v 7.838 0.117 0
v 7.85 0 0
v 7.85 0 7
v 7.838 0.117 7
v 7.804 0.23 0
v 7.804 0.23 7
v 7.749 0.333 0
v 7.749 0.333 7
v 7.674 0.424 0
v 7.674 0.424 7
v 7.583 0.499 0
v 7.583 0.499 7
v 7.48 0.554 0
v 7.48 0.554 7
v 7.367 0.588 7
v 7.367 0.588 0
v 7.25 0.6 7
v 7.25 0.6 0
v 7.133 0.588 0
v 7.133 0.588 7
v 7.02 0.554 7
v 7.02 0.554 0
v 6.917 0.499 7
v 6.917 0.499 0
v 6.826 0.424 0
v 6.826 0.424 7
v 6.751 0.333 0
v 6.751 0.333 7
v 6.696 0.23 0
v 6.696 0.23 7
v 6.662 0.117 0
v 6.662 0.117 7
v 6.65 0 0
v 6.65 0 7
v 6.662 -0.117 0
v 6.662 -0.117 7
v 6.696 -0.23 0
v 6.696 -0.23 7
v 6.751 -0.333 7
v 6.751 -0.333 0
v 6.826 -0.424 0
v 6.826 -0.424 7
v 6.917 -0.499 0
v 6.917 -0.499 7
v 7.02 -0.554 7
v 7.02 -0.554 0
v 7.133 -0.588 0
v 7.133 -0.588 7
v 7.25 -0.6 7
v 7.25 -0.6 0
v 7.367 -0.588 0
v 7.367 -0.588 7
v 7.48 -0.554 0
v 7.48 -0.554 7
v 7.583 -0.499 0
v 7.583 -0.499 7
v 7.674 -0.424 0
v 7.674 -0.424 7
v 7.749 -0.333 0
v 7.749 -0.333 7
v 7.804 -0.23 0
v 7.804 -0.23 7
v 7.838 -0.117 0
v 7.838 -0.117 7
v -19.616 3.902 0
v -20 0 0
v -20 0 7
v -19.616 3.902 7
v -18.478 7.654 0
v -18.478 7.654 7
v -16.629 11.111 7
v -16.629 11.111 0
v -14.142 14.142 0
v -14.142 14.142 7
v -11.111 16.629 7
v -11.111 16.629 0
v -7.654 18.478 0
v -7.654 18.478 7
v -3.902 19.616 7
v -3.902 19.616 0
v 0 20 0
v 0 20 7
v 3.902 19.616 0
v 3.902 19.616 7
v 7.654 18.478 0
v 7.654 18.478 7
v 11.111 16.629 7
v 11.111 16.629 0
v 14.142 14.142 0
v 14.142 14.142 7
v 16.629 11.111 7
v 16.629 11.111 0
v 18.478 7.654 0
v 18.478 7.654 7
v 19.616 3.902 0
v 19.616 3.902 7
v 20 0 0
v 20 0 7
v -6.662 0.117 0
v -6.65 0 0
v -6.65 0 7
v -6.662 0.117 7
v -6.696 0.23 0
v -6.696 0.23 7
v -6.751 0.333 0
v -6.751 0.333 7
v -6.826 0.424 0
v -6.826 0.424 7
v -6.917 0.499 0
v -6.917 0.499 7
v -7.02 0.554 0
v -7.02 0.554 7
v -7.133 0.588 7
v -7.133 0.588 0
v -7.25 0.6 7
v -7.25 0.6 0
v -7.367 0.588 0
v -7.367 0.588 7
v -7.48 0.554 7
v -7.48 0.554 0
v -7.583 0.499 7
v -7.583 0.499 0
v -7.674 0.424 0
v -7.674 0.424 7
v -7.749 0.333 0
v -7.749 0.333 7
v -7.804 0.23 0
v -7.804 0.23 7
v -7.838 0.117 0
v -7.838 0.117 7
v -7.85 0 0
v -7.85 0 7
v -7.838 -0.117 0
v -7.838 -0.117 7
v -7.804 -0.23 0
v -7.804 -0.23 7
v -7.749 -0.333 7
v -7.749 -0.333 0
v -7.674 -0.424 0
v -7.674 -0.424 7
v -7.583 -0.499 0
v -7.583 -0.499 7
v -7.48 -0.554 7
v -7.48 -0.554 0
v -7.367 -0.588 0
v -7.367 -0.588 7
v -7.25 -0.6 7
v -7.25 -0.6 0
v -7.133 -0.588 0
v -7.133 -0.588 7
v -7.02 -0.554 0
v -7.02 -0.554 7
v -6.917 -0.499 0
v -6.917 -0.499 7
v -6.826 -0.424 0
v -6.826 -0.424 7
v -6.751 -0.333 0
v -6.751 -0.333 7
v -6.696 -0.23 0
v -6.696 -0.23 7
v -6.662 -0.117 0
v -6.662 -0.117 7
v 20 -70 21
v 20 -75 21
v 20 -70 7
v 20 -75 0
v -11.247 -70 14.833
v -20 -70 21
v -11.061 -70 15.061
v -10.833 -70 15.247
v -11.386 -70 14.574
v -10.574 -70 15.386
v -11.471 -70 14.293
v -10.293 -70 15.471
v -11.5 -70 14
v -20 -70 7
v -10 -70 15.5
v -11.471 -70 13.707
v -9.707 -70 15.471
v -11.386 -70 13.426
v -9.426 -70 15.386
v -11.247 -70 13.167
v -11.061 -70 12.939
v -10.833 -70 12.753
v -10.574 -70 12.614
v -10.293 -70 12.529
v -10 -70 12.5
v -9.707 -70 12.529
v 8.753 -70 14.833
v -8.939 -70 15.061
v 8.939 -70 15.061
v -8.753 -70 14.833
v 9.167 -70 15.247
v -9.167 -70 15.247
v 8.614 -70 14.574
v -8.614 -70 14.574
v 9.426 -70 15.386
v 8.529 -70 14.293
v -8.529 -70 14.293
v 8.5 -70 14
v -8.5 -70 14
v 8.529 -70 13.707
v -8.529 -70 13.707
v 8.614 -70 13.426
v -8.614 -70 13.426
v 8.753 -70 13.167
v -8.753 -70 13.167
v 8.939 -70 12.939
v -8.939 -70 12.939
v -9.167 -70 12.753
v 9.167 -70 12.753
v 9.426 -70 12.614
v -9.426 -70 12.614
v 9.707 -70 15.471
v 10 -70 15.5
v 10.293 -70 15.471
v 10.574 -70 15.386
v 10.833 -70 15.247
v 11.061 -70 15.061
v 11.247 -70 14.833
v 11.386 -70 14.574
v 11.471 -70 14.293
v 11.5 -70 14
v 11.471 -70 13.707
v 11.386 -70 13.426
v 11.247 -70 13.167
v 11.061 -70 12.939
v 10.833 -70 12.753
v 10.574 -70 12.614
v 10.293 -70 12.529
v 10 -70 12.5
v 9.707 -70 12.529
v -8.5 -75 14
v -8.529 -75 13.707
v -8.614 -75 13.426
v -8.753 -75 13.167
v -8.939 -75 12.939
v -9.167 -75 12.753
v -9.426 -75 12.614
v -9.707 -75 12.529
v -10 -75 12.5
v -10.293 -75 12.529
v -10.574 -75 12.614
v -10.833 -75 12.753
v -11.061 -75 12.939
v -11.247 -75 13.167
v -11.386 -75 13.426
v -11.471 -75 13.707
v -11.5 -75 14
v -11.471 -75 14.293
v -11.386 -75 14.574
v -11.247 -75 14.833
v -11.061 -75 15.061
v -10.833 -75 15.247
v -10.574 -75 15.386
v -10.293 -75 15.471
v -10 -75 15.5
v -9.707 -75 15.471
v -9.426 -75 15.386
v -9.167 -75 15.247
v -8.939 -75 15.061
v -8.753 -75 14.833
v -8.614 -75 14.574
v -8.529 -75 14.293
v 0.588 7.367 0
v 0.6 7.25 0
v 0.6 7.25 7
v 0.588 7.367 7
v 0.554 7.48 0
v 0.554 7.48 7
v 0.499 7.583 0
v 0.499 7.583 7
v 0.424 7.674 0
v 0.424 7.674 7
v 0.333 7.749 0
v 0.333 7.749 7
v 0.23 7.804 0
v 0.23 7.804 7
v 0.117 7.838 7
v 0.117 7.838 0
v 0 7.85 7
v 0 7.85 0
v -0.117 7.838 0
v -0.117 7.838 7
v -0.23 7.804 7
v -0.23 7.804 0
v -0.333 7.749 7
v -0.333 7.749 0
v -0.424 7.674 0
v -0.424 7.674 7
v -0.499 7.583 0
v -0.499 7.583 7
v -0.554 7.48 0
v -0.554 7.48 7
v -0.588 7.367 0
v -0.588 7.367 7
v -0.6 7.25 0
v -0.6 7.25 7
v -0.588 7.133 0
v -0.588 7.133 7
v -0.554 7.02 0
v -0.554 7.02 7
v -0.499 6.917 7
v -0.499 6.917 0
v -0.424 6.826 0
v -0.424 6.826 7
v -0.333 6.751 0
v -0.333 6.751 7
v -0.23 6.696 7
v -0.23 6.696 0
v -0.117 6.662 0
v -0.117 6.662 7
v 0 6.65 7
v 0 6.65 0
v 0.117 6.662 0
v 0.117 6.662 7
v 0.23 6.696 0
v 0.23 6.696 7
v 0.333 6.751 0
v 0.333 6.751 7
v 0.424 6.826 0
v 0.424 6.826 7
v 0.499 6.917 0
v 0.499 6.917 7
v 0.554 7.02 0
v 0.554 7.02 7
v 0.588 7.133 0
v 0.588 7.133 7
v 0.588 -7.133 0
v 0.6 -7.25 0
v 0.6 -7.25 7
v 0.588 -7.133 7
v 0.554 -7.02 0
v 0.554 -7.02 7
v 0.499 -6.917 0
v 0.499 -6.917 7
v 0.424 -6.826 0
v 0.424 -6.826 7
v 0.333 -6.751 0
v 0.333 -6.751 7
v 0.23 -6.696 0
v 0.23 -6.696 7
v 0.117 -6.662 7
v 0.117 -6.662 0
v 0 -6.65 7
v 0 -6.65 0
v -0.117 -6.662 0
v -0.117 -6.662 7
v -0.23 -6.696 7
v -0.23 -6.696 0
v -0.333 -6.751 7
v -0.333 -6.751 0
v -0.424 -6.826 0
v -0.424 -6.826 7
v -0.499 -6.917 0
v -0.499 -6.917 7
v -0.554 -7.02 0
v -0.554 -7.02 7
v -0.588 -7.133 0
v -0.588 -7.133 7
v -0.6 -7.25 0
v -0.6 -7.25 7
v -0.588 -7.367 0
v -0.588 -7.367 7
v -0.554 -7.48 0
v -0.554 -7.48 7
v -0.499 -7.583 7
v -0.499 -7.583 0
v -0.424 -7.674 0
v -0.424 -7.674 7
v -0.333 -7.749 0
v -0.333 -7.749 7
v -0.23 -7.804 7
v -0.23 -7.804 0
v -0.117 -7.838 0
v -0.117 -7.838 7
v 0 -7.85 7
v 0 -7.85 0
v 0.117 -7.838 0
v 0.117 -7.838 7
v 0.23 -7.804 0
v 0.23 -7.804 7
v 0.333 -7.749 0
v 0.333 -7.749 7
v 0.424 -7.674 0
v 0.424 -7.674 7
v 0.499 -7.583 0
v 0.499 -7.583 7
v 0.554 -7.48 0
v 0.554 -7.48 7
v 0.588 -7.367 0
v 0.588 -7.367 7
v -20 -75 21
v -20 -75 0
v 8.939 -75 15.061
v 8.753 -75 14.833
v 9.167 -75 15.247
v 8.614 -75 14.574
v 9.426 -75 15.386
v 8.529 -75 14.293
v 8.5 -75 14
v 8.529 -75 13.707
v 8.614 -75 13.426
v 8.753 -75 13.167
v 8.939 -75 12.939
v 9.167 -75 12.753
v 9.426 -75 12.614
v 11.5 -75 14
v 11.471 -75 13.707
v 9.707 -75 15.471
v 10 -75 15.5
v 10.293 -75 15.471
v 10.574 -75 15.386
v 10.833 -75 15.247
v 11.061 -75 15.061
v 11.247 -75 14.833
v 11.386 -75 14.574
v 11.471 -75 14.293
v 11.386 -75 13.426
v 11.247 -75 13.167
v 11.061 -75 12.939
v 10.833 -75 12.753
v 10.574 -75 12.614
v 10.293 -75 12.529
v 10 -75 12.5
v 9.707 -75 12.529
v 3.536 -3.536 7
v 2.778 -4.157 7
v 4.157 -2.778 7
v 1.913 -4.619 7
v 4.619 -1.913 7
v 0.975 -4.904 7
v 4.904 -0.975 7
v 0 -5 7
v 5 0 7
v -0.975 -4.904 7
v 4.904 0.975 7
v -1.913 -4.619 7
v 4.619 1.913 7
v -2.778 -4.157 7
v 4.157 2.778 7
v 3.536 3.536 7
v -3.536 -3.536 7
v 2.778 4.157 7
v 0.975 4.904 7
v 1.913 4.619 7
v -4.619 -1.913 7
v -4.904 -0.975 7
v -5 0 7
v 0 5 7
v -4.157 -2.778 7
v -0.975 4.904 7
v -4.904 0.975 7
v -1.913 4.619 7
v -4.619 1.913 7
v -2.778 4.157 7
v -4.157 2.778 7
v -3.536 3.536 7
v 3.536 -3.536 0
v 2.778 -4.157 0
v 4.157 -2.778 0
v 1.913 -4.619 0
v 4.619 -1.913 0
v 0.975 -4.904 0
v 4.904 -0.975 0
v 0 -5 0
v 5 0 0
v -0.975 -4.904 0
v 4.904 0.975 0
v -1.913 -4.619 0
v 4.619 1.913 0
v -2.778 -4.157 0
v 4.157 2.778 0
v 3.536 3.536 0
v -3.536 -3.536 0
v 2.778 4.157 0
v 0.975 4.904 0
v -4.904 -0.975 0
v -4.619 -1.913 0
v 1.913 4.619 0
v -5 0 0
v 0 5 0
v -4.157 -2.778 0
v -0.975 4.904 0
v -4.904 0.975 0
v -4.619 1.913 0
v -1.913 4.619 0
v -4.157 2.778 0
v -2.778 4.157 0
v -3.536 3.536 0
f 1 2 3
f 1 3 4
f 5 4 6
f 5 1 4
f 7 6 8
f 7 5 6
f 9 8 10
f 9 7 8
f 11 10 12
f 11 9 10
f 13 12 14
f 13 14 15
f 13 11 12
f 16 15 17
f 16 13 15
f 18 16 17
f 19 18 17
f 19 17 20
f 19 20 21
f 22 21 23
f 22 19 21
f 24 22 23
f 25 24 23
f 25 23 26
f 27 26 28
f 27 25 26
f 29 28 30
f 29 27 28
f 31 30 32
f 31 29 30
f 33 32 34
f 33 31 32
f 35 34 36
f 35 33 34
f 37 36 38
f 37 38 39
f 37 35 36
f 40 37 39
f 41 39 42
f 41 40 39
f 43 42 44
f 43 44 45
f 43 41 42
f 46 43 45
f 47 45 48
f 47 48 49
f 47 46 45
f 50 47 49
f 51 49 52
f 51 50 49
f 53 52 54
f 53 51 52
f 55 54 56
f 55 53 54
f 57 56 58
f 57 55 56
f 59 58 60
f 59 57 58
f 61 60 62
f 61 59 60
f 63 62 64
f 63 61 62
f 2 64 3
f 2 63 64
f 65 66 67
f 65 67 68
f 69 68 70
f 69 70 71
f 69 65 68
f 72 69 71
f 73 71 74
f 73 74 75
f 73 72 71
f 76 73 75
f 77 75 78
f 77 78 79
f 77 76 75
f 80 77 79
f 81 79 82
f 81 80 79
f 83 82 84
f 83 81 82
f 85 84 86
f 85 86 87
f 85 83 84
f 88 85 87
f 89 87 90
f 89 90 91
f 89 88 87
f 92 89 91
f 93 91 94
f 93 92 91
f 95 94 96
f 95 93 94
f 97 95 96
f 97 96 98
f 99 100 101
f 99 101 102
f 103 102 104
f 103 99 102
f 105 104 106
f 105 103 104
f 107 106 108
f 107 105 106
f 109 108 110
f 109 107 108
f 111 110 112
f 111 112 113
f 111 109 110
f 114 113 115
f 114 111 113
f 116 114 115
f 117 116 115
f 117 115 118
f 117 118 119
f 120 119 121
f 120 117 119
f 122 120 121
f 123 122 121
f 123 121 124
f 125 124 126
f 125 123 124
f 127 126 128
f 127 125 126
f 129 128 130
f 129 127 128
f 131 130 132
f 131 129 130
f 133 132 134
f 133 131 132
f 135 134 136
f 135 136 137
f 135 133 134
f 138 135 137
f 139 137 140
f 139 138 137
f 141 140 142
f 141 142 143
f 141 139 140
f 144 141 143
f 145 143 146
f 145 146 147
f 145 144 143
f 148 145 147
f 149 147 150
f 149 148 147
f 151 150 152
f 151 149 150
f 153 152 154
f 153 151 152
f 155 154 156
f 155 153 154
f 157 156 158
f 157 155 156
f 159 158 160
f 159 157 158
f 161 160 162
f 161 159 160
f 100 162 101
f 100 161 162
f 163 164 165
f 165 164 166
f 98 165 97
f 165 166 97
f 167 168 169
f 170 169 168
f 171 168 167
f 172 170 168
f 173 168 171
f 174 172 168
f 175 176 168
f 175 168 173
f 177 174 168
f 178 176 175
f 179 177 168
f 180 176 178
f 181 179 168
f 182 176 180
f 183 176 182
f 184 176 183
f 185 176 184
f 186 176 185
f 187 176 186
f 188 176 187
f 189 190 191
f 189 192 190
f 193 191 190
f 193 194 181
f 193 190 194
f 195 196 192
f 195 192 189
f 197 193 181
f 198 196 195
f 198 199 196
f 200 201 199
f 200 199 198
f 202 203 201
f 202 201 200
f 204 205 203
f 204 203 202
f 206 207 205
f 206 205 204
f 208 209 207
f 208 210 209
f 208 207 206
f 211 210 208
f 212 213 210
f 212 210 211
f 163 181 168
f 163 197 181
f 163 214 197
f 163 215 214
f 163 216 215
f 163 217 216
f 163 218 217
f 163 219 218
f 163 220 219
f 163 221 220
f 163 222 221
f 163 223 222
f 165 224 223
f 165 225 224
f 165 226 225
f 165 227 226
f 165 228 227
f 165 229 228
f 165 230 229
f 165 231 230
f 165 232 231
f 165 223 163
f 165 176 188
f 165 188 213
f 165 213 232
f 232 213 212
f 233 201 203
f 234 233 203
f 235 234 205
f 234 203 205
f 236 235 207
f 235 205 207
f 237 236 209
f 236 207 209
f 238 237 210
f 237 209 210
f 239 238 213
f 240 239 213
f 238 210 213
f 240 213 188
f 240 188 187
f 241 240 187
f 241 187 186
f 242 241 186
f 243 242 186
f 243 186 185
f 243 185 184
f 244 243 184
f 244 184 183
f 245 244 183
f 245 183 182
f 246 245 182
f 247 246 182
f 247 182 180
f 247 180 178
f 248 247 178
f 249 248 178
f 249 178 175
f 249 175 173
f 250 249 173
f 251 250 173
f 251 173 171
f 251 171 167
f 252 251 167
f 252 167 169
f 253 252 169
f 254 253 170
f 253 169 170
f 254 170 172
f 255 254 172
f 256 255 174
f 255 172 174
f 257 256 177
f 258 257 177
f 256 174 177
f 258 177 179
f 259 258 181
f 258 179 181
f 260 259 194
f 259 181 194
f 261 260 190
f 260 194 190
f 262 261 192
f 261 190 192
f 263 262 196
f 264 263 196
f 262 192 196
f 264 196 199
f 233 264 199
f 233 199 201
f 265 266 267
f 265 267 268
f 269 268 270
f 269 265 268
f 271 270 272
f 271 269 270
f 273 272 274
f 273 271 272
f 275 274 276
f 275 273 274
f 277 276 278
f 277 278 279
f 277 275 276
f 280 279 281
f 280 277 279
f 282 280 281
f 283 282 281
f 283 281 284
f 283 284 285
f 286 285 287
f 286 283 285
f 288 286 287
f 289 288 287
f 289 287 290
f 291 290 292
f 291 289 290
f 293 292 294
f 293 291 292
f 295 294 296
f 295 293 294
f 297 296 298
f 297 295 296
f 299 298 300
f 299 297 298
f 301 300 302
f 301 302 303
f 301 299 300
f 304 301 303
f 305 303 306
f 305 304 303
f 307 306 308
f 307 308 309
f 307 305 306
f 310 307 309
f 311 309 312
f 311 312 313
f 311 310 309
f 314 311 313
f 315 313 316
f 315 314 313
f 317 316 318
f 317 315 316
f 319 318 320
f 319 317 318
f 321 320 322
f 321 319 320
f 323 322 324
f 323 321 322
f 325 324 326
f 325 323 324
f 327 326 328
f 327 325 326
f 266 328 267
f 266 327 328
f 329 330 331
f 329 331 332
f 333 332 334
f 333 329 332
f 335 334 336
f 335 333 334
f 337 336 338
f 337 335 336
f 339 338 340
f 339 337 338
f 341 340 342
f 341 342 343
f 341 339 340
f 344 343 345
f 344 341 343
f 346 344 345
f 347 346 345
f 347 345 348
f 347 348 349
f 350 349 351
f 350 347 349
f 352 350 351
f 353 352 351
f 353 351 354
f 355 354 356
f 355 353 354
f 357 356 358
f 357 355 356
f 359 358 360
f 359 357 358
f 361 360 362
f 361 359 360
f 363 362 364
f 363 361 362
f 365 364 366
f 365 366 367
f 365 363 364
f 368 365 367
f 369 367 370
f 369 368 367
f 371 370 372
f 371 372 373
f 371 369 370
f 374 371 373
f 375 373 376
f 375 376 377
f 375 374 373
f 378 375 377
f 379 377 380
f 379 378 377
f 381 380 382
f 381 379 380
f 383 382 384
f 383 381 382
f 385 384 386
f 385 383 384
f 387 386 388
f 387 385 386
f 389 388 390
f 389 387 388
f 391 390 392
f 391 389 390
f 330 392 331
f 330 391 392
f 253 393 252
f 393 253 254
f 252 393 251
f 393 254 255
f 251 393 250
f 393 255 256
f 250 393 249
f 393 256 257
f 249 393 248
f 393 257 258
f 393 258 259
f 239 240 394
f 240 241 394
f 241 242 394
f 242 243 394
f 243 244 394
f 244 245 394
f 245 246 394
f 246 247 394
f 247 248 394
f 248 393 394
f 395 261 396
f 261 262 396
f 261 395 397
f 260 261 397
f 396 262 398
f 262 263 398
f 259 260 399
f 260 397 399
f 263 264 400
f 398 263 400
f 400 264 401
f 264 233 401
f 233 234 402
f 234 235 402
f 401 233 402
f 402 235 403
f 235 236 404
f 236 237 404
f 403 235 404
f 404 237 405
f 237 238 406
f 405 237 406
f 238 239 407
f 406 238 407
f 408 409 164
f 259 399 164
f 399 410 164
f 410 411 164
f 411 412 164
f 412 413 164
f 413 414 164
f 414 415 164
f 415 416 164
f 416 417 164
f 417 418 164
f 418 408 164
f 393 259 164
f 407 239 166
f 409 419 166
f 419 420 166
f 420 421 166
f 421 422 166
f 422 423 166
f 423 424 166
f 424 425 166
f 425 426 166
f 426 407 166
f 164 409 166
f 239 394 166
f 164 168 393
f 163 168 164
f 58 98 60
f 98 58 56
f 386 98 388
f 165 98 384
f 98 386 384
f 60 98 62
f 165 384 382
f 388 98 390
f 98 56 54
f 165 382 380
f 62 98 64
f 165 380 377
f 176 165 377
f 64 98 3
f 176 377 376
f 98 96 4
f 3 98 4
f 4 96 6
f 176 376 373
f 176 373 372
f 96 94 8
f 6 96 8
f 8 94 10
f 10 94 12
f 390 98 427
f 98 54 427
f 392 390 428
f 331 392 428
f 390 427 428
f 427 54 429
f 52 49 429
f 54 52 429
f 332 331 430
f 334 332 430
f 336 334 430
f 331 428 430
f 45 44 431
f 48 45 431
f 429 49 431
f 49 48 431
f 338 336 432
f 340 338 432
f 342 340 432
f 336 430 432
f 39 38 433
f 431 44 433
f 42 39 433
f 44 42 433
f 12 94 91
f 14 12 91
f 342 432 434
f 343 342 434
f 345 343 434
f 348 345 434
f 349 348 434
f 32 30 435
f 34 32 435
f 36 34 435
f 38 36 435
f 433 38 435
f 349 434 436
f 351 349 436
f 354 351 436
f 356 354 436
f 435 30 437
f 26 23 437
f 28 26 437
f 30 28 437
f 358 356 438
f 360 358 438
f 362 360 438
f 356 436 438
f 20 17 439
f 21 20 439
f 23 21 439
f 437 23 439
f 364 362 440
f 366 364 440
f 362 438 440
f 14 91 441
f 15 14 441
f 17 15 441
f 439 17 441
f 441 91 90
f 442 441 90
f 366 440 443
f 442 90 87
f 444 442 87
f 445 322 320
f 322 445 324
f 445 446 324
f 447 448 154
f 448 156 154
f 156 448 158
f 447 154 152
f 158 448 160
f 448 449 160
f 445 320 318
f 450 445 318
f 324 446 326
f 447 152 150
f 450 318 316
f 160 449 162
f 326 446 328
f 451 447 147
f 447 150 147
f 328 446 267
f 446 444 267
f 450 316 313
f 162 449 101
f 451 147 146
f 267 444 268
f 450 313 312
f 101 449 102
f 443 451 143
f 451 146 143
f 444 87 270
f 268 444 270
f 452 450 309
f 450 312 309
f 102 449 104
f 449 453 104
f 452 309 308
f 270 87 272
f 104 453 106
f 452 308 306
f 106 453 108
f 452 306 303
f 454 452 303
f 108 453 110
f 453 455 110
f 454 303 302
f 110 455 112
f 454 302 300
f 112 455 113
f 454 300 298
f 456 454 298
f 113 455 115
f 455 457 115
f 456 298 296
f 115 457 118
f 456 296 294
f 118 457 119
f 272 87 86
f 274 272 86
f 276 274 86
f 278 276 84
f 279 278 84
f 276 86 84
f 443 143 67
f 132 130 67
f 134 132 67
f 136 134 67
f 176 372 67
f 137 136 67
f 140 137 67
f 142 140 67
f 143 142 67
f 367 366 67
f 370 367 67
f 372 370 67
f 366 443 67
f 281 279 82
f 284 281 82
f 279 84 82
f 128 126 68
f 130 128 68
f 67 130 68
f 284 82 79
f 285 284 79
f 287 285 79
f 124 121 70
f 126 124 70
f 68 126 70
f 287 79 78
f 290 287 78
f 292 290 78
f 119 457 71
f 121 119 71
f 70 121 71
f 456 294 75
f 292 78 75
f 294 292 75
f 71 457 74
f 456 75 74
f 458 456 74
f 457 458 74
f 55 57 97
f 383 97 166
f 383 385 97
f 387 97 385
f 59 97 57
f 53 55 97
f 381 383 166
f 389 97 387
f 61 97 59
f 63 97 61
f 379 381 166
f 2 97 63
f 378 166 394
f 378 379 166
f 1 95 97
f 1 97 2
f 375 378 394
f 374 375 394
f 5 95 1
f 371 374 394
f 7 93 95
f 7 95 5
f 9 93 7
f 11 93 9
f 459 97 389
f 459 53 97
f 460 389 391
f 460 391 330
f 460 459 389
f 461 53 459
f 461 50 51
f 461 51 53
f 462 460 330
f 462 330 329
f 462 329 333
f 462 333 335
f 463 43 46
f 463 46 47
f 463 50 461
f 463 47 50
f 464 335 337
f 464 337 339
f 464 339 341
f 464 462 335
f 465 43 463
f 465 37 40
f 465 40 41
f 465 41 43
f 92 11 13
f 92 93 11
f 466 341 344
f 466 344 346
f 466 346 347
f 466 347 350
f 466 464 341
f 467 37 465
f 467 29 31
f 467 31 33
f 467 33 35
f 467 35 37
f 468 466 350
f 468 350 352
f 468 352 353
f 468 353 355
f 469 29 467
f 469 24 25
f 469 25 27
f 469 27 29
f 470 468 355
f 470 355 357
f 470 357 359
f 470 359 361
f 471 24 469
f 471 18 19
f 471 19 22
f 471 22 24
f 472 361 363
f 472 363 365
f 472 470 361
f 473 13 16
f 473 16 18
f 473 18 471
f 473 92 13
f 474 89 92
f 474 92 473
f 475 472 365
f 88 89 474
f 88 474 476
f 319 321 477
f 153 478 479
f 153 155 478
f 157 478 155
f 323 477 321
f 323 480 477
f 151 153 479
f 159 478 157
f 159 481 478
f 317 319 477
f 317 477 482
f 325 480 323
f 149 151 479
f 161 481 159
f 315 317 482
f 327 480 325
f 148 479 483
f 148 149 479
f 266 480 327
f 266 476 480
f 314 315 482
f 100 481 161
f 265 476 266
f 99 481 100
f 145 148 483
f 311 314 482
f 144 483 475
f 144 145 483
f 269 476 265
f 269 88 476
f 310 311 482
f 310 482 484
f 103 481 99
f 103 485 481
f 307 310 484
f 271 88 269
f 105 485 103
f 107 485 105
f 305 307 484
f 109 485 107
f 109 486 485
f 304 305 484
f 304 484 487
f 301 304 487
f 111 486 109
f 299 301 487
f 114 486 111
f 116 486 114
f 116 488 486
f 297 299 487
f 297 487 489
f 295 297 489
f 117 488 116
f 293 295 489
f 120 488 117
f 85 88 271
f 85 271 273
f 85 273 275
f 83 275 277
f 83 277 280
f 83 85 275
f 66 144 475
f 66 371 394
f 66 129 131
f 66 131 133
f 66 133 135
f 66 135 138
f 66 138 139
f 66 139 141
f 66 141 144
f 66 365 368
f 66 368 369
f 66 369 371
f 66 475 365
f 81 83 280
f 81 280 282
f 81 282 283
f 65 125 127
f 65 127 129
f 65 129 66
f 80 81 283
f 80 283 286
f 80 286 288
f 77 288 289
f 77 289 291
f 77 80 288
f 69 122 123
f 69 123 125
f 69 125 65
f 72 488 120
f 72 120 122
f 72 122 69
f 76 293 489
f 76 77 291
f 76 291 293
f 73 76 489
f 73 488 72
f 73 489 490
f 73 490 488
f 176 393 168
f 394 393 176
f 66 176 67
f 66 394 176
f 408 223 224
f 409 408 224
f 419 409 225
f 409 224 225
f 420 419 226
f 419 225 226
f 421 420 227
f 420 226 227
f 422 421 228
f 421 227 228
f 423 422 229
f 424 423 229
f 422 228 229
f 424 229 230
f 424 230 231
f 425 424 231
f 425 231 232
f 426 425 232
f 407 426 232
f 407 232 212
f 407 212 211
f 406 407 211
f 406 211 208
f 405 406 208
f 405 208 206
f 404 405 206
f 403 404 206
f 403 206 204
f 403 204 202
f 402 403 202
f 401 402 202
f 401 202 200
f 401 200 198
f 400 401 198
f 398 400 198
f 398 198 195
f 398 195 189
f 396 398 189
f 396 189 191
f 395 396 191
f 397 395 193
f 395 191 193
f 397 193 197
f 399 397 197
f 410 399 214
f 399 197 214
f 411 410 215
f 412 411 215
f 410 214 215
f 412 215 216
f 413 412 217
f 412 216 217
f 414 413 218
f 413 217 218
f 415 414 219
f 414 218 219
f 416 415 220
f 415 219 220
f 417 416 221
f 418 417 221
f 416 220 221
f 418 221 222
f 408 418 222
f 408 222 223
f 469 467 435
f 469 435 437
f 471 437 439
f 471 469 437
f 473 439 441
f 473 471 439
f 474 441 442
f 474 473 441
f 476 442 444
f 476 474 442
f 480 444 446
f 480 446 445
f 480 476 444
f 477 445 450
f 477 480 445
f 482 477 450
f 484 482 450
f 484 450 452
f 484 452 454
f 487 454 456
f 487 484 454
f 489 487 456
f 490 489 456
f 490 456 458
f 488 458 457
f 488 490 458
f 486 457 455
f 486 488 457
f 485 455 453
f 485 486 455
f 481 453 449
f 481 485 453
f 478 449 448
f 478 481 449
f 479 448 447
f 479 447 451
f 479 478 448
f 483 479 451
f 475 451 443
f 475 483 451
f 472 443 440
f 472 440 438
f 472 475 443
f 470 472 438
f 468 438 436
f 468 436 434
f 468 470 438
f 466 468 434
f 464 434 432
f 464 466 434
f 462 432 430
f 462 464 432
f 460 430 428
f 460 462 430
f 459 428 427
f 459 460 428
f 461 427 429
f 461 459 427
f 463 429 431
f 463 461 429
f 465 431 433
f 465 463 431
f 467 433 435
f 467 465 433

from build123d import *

# Parameters (mm, degrees)
SKETCH1_R           = 5
SKETCH1_R_2         = 0.6
BOSS_EXTRUDE1_DEPTH = 7
SKETCH2_W           = 40
SKETCH2_H           = 5
BOSS_EXTRUDE2_DEPTH = 14
SKETCH3_R           = 1.5
CUT_EXTRUDE1_DEPTH  = 6


with BuildPart() as part:
    # Sketch1 → Boss-Extrude1 (new body)
    with BuildSketch(Plane.XY):
        with BuildLine():
            Line((20, 0), (20, -75))
            Line((20, -75), (-20, -75))
            Line((-20, -75), (-20, 0))
            ThreePointArc((-20, 0), (0, 20), (20, 0))
        make_face()
        Circle(SKETCH1_R, mode=Mode.SUBTRACT)
        with Locations((0, 7.25)):
            Circle(SKETCH1_R_2, mode=Mode.SUBTRACT)
        with Locations((-7.25, 0)):
            Circle(SKETCH1_R_2, mode=Mode.SUBTRACT)
        with Locations((0, -7.25)):
            Circle(SKETCH1_R_2, mode=Mode.SUBTRACT)
        with Locations((7.25, 0)):
            Circle(SKETCH1_R_2, mode=Mode.SUBTRACT)
    extrude(amount=BOSS_EXTRUDE1_DEPTH)

    # Sketch2 → Boss-Extrude2 (add)
    with BuildSketch(Plane.XY.offset(7)):
        with Locations((0, -72.5)):
            Rectangle(SKETCH2_W, SKETCH2_H)
    extrude(amount=BOSS_EXTRUDE2_DEPTH)

    # Sketch3 → Cut-Extrude1 (cut, through all)
    with BuildSketch(Plane(origin=(0, -70, 0), x_dir=(1, 0, 0), z_dir=(0, 1, 0))):
        with Locations((-10, -14)):
            Circle(SKETCH3_R)
        with Locations((10, -14)):
            Circle(SKETCH3_R)
    extrude(amount=-CUT_EXTRUDE1_DEPTH, mode=Mode.SUBTRACT)


solid = part.part
